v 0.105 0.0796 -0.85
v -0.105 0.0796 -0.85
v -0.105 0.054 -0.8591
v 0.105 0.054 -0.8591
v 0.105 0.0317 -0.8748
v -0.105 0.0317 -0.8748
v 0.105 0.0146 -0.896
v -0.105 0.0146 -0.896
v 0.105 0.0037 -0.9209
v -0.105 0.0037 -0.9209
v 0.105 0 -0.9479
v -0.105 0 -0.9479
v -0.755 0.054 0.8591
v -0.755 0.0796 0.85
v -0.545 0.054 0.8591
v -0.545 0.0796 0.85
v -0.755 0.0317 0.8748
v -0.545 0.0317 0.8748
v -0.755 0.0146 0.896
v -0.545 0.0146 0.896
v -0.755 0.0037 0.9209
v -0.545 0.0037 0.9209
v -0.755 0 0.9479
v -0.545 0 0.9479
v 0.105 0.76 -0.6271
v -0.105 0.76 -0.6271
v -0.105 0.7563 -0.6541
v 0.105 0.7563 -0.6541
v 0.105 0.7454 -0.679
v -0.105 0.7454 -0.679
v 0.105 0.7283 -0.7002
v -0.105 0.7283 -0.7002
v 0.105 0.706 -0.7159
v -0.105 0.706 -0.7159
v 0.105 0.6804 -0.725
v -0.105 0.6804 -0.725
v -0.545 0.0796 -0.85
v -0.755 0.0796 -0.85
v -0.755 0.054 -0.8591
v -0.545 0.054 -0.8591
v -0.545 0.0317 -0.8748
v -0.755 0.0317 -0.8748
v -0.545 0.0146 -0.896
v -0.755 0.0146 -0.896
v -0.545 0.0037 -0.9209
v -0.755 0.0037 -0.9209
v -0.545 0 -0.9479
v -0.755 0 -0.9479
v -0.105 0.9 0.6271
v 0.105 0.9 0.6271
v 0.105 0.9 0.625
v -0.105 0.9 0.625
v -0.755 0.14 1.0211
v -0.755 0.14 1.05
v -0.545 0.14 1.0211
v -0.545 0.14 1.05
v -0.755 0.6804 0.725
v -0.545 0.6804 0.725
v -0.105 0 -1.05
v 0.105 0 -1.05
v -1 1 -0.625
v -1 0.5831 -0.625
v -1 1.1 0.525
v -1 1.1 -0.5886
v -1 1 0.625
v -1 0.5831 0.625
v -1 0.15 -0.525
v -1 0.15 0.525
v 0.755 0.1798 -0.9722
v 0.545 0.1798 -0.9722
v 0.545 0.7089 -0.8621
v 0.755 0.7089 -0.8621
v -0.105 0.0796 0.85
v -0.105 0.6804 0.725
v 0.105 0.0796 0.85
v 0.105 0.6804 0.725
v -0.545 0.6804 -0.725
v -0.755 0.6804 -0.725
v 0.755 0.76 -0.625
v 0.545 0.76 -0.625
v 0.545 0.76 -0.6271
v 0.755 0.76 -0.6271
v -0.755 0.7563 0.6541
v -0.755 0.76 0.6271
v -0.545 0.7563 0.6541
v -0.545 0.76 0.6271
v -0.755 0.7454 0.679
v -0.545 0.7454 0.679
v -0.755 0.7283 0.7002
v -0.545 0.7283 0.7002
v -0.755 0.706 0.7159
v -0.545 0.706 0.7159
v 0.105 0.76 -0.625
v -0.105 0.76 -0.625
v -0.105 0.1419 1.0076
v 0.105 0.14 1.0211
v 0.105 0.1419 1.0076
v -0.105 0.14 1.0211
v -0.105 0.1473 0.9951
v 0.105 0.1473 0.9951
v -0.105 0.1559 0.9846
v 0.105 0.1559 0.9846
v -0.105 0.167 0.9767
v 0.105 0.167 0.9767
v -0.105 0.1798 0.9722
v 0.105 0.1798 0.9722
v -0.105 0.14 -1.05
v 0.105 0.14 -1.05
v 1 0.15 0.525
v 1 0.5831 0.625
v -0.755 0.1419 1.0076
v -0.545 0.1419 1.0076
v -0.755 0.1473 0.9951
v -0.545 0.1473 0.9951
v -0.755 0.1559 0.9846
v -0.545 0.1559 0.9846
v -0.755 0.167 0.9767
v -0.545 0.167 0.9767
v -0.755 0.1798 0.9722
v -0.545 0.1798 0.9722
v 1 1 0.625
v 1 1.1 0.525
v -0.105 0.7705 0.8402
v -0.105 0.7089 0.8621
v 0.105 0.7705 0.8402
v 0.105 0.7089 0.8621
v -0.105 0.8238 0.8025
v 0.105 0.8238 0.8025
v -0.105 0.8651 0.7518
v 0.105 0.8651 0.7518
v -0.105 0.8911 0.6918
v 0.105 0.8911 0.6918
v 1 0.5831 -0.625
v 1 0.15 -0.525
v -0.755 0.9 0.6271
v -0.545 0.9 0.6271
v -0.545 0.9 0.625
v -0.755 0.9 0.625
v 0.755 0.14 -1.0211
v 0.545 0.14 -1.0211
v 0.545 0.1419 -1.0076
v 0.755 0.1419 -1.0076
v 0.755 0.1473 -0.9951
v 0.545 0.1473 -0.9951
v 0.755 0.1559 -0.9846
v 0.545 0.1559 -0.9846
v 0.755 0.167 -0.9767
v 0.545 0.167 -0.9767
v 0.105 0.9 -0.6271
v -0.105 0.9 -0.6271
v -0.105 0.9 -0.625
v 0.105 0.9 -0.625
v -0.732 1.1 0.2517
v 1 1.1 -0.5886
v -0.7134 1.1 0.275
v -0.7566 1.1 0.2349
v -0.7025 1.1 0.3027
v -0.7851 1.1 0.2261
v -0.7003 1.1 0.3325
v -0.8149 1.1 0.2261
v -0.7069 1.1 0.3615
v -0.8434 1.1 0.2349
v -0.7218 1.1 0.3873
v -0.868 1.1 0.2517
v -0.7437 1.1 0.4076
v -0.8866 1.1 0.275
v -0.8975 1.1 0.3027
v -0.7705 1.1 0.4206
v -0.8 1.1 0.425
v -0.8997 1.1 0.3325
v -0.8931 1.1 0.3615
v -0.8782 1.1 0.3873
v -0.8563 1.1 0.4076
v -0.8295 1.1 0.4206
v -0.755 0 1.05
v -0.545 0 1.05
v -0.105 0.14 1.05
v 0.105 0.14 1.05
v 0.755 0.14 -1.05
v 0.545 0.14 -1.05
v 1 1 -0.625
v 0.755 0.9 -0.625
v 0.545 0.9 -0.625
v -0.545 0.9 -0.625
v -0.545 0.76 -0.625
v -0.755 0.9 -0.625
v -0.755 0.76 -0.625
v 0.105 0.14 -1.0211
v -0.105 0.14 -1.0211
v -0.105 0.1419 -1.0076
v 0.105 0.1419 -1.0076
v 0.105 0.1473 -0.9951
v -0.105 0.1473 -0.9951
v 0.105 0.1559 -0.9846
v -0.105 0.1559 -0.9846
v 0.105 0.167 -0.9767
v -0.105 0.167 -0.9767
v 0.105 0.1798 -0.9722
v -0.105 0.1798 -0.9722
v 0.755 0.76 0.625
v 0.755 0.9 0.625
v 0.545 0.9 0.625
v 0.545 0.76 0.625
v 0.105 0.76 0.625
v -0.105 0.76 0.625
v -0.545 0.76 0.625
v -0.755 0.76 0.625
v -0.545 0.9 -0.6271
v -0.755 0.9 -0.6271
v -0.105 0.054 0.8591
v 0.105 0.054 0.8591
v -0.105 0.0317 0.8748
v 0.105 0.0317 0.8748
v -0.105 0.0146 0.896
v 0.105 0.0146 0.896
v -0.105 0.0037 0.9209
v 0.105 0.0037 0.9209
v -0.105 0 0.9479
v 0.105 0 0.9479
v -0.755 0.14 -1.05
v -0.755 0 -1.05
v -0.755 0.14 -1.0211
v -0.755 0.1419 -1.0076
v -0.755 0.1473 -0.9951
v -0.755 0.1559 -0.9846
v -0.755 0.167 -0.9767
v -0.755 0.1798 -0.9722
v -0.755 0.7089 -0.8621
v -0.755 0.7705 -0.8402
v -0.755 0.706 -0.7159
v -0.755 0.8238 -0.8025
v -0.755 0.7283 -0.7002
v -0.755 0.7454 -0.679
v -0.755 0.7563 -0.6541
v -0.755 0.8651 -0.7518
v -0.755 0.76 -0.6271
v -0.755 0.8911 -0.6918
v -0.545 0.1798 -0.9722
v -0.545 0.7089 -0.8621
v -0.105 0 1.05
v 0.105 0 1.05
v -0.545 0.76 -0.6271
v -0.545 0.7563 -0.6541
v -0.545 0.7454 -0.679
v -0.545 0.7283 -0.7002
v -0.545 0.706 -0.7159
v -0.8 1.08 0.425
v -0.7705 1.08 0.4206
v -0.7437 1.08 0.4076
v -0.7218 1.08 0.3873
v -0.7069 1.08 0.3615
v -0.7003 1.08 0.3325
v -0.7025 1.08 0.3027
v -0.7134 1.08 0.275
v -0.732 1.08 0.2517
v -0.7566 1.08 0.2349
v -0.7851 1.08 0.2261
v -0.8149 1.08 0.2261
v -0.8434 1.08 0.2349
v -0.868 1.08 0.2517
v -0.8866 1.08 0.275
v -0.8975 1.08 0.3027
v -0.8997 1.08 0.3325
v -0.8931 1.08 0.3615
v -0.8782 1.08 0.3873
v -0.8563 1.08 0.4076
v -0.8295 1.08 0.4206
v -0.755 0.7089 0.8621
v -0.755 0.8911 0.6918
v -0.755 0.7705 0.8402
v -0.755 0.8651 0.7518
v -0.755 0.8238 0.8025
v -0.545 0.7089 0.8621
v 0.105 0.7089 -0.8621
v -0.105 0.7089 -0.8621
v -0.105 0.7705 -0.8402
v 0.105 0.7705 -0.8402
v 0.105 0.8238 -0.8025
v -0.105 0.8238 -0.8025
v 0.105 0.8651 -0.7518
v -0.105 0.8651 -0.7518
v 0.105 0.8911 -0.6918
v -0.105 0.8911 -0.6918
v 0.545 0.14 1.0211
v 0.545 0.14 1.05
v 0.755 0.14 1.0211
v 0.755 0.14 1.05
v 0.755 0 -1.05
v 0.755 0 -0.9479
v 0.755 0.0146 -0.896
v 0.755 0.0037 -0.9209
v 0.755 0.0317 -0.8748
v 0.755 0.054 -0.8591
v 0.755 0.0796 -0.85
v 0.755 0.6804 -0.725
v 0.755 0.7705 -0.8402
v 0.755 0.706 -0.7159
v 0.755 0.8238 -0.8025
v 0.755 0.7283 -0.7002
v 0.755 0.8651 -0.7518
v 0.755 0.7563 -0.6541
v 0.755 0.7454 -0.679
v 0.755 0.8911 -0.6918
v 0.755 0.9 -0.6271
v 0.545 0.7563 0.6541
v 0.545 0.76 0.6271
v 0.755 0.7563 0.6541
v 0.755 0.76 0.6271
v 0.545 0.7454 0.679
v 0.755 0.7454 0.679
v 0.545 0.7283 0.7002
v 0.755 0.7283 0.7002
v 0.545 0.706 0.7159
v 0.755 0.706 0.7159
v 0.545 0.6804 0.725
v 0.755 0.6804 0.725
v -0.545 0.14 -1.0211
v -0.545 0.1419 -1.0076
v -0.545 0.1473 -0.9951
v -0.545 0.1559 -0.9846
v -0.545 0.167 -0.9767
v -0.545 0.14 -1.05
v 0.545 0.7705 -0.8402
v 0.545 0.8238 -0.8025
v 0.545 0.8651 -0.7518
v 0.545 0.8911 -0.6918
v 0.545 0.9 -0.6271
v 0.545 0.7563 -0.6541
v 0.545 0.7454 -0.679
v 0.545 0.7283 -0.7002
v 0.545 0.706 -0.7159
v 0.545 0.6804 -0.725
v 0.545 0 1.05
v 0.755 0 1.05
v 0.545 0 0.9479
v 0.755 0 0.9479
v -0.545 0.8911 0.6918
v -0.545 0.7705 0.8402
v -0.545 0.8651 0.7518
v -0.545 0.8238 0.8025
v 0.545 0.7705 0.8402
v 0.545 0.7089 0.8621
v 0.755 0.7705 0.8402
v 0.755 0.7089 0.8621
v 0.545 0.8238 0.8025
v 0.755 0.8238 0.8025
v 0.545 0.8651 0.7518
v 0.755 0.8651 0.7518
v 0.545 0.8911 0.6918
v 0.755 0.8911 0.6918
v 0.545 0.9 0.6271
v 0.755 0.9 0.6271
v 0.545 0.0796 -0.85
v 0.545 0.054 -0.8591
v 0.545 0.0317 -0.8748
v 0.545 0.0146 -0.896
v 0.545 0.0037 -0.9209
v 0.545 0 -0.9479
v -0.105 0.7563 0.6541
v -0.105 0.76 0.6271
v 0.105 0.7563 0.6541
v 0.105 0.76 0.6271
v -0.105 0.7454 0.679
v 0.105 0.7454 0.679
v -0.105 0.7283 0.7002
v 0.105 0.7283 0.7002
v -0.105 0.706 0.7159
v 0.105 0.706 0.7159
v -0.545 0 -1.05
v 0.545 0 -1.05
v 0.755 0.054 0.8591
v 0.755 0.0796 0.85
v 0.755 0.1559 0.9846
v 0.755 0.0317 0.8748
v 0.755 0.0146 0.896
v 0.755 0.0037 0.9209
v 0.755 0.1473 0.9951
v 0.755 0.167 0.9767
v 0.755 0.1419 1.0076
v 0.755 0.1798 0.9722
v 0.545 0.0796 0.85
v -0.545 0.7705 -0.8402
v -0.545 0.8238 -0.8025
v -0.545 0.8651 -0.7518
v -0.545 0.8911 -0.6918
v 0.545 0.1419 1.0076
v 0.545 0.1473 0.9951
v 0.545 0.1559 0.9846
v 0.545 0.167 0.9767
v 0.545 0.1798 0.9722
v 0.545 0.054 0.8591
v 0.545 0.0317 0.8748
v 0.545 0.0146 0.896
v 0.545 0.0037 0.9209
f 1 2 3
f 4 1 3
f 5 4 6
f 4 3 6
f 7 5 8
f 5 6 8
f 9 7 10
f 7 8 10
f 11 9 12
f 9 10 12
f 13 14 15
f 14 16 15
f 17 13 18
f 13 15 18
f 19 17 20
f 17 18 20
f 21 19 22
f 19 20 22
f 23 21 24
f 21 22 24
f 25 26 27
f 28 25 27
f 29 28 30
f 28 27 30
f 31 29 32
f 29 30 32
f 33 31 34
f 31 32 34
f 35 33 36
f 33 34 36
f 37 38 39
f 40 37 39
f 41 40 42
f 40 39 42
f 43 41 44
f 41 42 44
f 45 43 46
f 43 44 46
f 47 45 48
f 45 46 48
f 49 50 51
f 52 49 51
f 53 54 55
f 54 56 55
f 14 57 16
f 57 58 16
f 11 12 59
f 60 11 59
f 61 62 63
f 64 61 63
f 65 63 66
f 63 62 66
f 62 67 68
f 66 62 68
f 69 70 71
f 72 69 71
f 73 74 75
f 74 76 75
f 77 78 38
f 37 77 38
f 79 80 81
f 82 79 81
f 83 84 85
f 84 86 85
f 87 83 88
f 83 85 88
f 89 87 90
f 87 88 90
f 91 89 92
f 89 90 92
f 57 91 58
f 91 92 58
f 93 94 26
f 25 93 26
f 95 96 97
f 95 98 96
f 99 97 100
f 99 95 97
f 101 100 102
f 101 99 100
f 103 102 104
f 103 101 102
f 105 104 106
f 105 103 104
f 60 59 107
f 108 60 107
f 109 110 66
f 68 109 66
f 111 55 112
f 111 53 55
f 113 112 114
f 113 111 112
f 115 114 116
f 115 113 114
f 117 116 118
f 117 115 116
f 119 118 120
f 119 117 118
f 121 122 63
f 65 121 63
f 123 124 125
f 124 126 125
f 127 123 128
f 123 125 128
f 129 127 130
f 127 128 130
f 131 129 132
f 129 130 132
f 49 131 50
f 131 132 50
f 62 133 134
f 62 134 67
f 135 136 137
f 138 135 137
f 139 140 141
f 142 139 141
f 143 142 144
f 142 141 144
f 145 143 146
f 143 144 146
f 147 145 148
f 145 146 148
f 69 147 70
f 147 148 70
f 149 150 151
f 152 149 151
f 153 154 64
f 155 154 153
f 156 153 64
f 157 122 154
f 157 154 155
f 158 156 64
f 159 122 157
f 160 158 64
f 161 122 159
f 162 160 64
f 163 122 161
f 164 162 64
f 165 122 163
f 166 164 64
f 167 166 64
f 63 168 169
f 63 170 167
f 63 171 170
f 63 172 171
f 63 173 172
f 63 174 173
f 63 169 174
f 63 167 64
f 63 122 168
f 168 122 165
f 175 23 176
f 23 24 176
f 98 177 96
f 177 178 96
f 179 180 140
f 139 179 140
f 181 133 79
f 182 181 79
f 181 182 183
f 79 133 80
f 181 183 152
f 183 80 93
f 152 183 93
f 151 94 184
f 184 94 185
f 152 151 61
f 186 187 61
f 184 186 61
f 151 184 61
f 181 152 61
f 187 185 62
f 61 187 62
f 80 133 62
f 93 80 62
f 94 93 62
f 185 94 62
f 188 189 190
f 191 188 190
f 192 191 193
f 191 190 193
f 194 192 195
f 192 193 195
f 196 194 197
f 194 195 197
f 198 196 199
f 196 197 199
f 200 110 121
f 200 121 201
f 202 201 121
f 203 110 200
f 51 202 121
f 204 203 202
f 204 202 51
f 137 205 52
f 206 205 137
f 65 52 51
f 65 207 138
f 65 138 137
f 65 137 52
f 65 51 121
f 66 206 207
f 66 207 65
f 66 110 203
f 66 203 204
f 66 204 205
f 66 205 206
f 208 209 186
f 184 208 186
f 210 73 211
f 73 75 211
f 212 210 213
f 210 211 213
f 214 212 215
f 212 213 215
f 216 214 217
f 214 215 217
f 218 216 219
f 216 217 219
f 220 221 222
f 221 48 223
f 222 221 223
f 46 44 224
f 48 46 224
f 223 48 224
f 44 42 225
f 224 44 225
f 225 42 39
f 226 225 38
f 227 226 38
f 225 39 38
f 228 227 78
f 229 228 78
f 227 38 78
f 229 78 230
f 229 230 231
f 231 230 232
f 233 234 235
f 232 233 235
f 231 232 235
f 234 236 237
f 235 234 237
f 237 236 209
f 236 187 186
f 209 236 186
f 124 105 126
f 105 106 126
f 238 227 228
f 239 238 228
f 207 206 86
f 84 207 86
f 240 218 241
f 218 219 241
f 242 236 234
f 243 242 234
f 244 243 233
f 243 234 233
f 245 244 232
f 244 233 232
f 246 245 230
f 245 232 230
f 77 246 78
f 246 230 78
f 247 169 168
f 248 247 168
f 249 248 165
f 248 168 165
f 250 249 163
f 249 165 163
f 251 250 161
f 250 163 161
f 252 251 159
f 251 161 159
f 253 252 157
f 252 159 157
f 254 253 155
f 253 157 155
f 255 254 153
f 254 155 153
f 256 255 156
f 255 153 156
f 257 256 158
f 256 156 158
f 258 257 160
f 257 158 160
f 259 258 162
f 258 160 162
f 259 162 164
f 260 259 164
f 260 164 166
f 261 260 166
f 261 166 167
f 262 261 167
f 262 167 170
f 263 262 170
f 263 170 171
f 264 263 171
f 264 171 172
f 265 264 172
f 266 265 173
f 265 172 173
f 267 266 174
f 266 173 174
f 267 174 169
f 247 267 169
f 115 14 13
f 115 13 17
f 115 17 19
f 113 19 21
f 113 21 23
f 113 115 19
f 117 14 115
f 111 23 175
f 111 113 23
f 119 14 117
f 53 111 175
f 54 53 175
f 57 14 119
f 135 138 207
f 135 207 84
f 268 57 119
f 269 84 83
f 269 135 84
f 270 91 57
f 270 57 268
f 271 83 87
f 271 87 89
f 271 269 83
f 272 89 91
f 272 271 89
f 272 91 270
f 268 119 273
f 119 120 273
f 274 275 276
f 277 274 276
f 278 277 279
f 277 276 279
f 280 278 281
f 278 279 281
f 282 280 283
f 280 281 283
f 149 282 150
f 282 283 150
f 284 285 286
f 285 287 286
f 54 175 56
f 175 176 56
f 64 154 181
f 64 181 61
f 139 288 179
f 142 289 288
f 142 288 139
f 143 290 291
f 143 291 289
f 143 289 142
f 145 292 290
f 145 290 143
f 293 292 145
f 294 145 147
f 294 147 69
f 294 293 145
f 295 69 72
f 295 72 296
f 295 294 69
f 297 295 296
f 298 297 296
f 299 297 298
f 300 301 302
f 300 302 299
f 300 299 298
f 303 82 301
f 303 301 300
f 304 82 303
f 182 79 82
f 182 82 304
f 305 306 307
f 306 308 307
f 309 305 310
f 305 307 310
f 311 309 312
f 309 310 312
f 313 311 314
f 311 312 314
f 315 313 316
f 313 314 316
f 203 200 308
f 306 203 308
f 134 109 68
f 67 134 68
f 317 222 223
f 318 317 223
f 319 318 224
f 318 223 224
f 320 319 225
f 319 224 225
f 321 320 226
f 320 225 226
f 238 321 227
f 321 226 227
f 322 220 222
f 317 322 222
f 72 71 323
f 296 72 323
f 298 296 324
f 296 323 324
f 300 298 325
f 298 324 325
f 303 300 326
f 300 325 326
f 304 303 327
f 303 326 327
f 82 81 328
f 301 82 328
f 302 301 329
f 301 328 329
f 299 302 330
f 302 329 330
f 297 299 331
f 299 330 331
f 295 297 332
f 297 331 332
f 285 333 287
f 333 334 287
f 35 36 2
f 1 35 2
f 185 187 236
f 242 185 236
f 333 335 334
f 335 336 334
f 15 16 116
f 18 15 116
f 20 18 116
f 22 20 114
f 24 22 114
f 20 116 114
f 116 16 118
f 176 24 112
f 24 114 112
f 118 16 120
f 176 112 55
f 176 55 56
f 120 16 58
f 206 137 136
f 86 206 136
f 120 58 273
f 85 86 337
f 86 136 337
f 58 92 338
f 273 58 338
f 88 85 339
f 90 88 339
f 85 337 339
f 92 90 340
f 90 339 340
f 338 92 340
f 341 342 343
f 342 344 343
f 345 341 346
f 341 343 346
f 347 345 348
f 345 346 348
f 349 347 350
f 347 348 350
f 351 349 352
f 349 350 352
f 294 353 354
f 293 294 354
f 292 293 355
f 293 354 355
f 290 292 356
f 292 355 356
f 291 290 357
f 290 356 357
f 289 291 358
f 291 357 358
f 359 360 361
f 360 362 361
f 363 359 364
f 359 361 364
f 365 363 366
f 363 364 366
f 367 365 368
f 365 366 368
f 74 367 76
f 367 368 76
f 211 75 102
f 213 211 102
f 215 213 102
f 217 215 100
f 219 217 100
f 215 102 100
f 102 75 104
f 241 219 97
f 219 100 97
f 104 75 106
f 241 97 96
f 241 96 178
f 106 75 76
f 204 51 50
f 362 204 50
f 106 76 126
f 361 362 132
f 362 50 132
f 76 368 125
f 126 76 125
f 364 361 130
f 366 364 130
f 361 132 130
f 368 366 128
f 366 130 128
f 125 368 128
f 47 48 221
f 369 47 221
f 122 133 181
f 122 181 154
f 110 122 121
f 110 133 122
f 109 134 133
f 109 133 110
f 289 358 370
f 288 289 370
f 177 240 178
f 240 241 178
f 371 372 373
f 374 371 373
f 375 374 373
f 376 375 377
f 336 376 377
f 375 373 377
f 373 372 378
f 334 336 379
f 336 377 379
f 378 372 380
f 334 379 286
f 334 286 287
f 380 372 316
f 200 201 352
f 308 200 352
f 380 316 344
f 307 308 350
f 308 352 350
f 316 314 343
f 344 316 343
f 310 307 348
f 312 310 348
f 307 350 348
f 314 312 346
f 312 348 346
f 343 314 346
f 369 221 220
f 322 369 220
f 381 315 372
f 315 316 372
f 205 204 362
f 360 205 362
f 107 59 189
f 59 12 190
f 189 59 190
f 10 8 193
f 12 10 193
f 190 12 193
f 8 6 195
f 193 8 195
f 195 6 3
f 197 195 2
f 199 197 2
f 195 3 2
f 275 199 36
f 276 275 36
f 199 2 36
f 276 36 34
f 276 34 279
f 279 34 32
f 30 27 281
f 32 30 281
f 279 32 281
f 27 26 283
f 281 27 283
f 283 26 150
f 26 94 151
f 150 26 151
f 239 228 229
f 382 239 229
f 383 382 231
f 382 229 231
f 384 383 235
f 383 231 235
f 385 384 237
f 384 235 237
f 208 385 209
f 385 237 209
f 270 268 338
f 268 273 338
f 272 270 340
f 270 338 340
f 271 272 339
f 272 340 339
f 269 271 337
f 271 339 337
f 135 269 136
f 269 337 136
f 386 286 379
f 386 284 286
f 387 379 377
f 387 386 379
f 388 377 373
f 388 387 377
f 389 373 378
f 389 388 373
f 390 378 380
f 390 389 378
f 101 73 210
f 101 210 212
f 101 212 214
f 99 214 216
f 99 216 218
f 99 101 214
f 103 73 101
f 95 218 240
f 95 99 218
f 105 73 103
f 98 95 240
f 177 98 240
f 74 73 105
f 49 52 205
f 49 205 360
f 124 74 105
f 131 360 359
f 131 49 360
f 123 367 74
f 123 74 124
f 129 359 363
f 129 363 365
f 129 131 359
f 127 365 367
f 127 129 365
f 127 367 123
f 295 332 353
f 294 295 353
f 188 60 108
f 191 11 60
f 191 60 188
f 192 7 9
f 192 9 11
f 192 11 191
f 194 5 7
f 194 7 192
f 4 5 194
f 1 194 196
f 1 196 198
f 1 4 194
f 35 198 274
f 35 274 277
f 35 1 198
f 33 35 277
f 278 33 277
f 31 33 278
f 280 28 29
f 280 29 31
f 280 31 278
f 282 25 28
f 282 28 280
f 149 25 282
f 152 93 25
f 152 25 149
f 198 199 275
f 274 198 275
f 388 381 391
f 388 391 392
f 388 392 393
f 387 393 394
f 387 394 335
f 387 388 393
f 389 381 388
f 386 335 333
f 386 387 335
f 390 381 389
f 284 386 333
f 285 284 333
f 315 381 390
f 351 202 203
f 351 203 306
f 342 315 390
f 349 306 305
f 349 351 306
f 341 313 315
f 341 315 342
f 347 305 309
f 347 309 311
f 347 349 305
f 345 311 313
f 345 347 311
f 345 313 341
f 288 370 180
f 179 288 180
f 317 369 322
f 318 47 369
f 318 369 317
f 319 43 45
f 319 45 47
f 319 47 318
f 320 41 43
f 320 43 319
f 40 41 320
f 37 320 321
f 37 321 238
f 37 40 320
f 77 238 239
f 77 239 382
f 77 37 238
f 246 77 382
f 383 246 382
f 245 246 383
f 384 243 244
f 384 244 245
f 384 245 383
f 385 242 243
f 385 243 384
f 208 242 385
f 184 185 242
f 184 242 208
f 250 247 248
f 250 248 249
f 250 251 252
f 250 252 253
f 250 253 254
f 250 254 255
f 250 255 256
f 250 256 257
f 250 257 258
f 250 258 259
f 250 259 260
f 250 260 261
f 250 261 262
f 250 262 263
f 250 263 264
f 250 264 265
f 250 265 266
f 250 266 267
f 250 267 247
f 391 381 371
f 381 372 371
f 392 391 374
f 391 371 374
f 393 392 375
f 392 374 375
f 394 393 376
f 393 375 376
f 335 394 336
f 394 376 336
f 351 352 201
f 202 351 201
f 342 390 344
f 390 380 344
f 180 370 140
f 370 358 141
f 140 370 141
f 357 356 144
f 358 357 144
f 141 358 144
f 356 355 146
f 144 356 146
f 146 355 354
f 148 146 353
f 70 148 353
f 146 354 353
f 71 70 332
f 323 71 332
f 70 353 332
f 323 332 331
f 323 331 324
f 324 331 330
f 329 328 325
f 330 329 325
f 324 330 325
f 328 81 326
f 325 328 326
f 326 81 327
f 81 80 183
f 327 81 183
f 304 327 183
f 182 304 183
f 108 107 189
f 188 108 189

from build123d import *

# Parameters (mm, degrees)
SKETCH_2_W                     = 2
SKETCH_2_H                     = 1.25
EXTRUDE_1_DEPTH                = 0.95
EXTRUDE_2_DEPTH                = 0.105
FILLET_1_R                     = 0.05
CHAMFER_1_SIZE                 = 0.1
PATTERN_LINEAR_2_COUNT         = 3
PATTERN_LINEAR_2_PITCH         = 0.65
FILLET_1_OF_PATTERN_LINEAR_2_R = 0.05
MIRROR_START                   = -0.755
MIRROR_1_DEPTH                 = 0.21
MIRROR_START_2                 = -0.105
MIRROR_1_2_DEPTH               = 0.21
MIRROR_START_3                 = 0.545
MIRROR_1_3_DEPTH               = 0.21
CHAMFER_2_SIZE                 = 0.1
CHAMFER_2_SIZE2                = 0.036397023
CHAMFER_3_SIZE                 = 0.1
CHAMFER_3_SIZE2                = 0.433147587
CHAMFER_4_SIZE                 = 0.1
CHAMFER_4_SIZE2                = 0.433147587
SKETCH_7_R                     = 0.1
CUT_EXTRUDE_2_DEPTH            = 0.02


# Read off the part's stored shape, not the designer's step: Зеркальное отражение1
with BuildPart() as part:
    # Эскиз2 → Бобышка-Вытянуть1 (new body)
    with BuildSketch(Plane(origin=(0, 0.15, 0), x_dir=(-1, 0, 0), z_dir=(0, 1, 0))):
        Rectangle(SKETCH_2_W, SKETCH_2_H)
    extrude(amount=EXTRUDE_1_DEPTH)

    # Эскиз4 → Вытянуть-Тонкостенный2 (add, symmetric)
    with BuildSketch(Plane(origin=(0.65, 0, 0), x_dir=(0, 0, -1), z_dir=(1, 0, 0))):
        with BuildLine():
            Line((-0.625, 0.76), (-0.627096927, 0.76))
            ThreePointArc((-0.627096927, 0.76), (-0.690195555, 0.737579399), (-0.725, 0.680371263))
            Line((-0.725, 0.680371263), (-0.85, 0.079628737))
            ThreePointArc((-0.85, 0.079628737), (-0.884804445, 0.022420601), (-0.947903073, 0))
            Line((-0.947903073, 0), (-1.05, 0))
            Line((-1.05, 0), (-1.05, 0.14))
            Line((-1.05, 0.14), (-0.980436776, 0.14))
            Line((-0.980436776, 0.14), (-0.862064302, 0.708891032))
            ThreePointArc((-0.862064302, 0.708891032), (-0.778533634, 0.846190558), (-0.627096927, 0.9))
            Line((-0.627096927, 0.9), (-0.625, 0.9))
            Line((-0.625, 0.9), (-0.625, 0.76))
        make_face()
    extrude_2 = extrude(amount=EXTRUDE_2_DEPTH, both=True)

    # Скругление1
    fillet_1_edges = [part.edges().sort_by_distance(p)[0] for p in [
        (0.65, 0.14, 0.980436776),
    ]]
    fillet(fillet_1_edges, radius=FILLET_1_R)

    # Фаска1
    chamfer_1_edges = [part.edges().sort_by_distance(p)[0] for p in [
        (0, 1.1, 0.625),
    ]]
    chamfer(chamfer_1_edges, length=CHAMFER_1_SIZE)

    # Линейный массив2: Вытянуть-Тонкостенный2 ×3
    with Locations(*[(-i * PATTERN_LINEAR_2_PITCH, 0, 0) for i in range(1, PATTERN_LINEAR_2_COUNT)]):
        add(extrude_2)

    # Скругление1 of Линейный массив2
    fillet_1_of_pattern_linear_2_edges = [part.edges().sort_by_distance(p)[0] for p in [
        (0, 0.14, 0.980436776),
        (-0.65, 0.14, 0.980436776),
    ]]
    fillet(fillet_1_of_pattern_linear_2_edges, radius=FILLET_1_OF_PATTERN_LINEAR_2_R)

    # Зеркальное отражение1 outline → Зеркальное отражение1 (add)
    with BuildSketch(Plane.YZ.offset(MIRROR_START)):
        with BuildLine():
            Line((0, -1.05), (0.14, -1.05))
            Line((0.14, -1.05), (0.14, -1.021103904))
            ThreePointArc((0.14, -1.021103904), (0.1512103, -0.98955459), (0.179814368, -0.972152368))
            Line((0.179814368, -0.972152368), (0.708891032, -0.862064302))
            ThreePointArc((0.708891032, -0.862064302), (0.846190558, -0.778533634), (0.9, -0.627096927))
            Line((0.9, -0.627096927), (0.9, -0.625))
            Line((0.9, -0.625), (0.76, -0.625))
            Line((0.76, -0.625), (0.76, -0.627096927))
            ThreePointArc((0.76, -0.627096927), (0.737579399, -0.690195555), (0.680371263, -0.725))
            Line((0.680371263, -0.725), (0.079628737, -0.85))
            ThreePointArc((0.079628737, -0.85), (0.022420601, -0.884804445), (0, -0.947903073))
            Line((0, -0.947903073), (0, -1.05))
        make_face()
    extrude(amount=MIRROR_1_DEPTH)

    # Mirror 1 2 outline → Mirror 1 2 (add)
    with BuildSketch(Plane.YZ.offset(MIRROR_START_2)):
        with BuildLine():
            Line((0, -1.05), (0.14, -1.05))
            Line((0.14, -1.05), (0.14, -1.021103904))
            ThreePointArc((0.14, -1.021103904), (0.1512103, -0.98955459), (0.179814368, -0.972152368))
            Line((0.179814368, -0.972152368), (0.708891032, -0.862064302))
            ThreePointArc((0.708891032, -0.862064302), (0.846190558, -0.778533634), (0.9, -0.627096927))
            Line((0.9, -0.627096927), (0.9, -0.625))
            Line((0.9, -0.625), (0.76, -0.625))
            Line((0.76, -0.625), (0.76, -0.627096927))
            ThreePointArc((0.76, -0.627096927), (0.737579399, -0.690195555), (0.680371263, -0.725))
            Line((0.680371263, -0.725), (0.079628737, -0.85))
            ThreePointArc((0.079628737, -0.85), (0.022420601, -0.884804445), (0, -0.947903073))
            Line((0, -0.947903073), (0, -1.05))
        make_face()
    extrude(amount=MIRROR_1_2_DEPTH)

    # Mirror 1 3 outline → Mirror 1 3 (add)
    with BuildSketch(Plane.YZ.offset(MIRROR_START_3)):
        with BuildLine():
            Line((0, -1.05), (0.14, -1.05))
            Line((0.14, -1.05), (0.14, -1.021103904))
            ThreePointArc((0.14, -1.021103904), (0.1512103, -0.98955459), (0.179814368, -0.972152368))
            Line((0.179814368, -0.972152368), (0.708891032, -0.862064302))
            ThreePointArc((0.708891032, -0.862064302), (0.846190558, -0.778533634), (0.9, -0.627096927))
            Line((0.9, -0.627096927), (0.9, -0.625))
            Line((0.9, -0.625), (0.76, -0.625))
            Line((0.76, -0.625), (0.76, -0.627096927))
            ThreePointArc((0.76, -0.627096927), (0.737579399, -0.690195555), (0.680371263, -0.725))
            Line((0.680371263, -0.725), (0.079628737, -0.85))
            ThreePointArc((0.079628737, -0.85), (0.022420601, -0.884804445), (0, -0.947903073))
            Line((0, -0.947903073), (0, -1.05))
        make_face()
    extrude(amount=MIRROR_1_3_DEPTH)

    # Фаска2
    chamfer_2_edges = [part.edges().sort_by_distance(p)[0] for p in [
        (0, 1.1, -0.625),
    ]]
    chamfer_2_side = [part.faces().sort_by_distance(p)[0] for p in [
        (0, 0.615020422, -0.625),
    ]]
    chamfer(chamfer_2_edges, length=CHAMFER_2_SIZE, length2=CHAMFER_2_SIZE2, reference=chamfer_2_side[0])

    # Фаска3
    chamfer_3_edges = [part.edges().sort_by_distance(p)[0] for p in [
        (0, 0.15, -0.625),
    ]]
    chamfer_3_side = [part.faces().sort_by_distance(p)[0] for p in [
        (0, 0.15, 0),
    ]]
    chamfer(chamfer_3_edges, length=CHAMFER_3_SIZE, length2=CHAMFER_3_SIZE2, reference=chamfer_3_side[0])

    # Фаска4
    chamfer_4_edges = [part.edges().sort_by_distance(p)[0] for p in [
        (0, 0.15, 0.625),
    ]]
    chamfer_4_side = [part.faces().sort_by_distance(p)[0] for p in [
        (0, 0.15, 0.05),
    ]]
    chamfer(chamfer_4_edges, length=CHAMFER_4_SIZE, length2=CHAMFER_4_SIZE2, reference=chamfer_4_side[0])

    # Эскиз7 → Вырез-Вытянуть2 (cut)
    with BuildSketch(Plane(origin=(0, 1.1, 0), x_dir=(1, 0, 0), z_dir=(0, 1, 0))):
        with Locations(Location((-0.8, -0.325, 0), (0, 0, 270))):
            Circle(SKETCH_7_R)
    extrude(amount=-CUT_EXTRUDE_2_DEPTH, mode=Mode.SUBTRACT)


solid = part.part
